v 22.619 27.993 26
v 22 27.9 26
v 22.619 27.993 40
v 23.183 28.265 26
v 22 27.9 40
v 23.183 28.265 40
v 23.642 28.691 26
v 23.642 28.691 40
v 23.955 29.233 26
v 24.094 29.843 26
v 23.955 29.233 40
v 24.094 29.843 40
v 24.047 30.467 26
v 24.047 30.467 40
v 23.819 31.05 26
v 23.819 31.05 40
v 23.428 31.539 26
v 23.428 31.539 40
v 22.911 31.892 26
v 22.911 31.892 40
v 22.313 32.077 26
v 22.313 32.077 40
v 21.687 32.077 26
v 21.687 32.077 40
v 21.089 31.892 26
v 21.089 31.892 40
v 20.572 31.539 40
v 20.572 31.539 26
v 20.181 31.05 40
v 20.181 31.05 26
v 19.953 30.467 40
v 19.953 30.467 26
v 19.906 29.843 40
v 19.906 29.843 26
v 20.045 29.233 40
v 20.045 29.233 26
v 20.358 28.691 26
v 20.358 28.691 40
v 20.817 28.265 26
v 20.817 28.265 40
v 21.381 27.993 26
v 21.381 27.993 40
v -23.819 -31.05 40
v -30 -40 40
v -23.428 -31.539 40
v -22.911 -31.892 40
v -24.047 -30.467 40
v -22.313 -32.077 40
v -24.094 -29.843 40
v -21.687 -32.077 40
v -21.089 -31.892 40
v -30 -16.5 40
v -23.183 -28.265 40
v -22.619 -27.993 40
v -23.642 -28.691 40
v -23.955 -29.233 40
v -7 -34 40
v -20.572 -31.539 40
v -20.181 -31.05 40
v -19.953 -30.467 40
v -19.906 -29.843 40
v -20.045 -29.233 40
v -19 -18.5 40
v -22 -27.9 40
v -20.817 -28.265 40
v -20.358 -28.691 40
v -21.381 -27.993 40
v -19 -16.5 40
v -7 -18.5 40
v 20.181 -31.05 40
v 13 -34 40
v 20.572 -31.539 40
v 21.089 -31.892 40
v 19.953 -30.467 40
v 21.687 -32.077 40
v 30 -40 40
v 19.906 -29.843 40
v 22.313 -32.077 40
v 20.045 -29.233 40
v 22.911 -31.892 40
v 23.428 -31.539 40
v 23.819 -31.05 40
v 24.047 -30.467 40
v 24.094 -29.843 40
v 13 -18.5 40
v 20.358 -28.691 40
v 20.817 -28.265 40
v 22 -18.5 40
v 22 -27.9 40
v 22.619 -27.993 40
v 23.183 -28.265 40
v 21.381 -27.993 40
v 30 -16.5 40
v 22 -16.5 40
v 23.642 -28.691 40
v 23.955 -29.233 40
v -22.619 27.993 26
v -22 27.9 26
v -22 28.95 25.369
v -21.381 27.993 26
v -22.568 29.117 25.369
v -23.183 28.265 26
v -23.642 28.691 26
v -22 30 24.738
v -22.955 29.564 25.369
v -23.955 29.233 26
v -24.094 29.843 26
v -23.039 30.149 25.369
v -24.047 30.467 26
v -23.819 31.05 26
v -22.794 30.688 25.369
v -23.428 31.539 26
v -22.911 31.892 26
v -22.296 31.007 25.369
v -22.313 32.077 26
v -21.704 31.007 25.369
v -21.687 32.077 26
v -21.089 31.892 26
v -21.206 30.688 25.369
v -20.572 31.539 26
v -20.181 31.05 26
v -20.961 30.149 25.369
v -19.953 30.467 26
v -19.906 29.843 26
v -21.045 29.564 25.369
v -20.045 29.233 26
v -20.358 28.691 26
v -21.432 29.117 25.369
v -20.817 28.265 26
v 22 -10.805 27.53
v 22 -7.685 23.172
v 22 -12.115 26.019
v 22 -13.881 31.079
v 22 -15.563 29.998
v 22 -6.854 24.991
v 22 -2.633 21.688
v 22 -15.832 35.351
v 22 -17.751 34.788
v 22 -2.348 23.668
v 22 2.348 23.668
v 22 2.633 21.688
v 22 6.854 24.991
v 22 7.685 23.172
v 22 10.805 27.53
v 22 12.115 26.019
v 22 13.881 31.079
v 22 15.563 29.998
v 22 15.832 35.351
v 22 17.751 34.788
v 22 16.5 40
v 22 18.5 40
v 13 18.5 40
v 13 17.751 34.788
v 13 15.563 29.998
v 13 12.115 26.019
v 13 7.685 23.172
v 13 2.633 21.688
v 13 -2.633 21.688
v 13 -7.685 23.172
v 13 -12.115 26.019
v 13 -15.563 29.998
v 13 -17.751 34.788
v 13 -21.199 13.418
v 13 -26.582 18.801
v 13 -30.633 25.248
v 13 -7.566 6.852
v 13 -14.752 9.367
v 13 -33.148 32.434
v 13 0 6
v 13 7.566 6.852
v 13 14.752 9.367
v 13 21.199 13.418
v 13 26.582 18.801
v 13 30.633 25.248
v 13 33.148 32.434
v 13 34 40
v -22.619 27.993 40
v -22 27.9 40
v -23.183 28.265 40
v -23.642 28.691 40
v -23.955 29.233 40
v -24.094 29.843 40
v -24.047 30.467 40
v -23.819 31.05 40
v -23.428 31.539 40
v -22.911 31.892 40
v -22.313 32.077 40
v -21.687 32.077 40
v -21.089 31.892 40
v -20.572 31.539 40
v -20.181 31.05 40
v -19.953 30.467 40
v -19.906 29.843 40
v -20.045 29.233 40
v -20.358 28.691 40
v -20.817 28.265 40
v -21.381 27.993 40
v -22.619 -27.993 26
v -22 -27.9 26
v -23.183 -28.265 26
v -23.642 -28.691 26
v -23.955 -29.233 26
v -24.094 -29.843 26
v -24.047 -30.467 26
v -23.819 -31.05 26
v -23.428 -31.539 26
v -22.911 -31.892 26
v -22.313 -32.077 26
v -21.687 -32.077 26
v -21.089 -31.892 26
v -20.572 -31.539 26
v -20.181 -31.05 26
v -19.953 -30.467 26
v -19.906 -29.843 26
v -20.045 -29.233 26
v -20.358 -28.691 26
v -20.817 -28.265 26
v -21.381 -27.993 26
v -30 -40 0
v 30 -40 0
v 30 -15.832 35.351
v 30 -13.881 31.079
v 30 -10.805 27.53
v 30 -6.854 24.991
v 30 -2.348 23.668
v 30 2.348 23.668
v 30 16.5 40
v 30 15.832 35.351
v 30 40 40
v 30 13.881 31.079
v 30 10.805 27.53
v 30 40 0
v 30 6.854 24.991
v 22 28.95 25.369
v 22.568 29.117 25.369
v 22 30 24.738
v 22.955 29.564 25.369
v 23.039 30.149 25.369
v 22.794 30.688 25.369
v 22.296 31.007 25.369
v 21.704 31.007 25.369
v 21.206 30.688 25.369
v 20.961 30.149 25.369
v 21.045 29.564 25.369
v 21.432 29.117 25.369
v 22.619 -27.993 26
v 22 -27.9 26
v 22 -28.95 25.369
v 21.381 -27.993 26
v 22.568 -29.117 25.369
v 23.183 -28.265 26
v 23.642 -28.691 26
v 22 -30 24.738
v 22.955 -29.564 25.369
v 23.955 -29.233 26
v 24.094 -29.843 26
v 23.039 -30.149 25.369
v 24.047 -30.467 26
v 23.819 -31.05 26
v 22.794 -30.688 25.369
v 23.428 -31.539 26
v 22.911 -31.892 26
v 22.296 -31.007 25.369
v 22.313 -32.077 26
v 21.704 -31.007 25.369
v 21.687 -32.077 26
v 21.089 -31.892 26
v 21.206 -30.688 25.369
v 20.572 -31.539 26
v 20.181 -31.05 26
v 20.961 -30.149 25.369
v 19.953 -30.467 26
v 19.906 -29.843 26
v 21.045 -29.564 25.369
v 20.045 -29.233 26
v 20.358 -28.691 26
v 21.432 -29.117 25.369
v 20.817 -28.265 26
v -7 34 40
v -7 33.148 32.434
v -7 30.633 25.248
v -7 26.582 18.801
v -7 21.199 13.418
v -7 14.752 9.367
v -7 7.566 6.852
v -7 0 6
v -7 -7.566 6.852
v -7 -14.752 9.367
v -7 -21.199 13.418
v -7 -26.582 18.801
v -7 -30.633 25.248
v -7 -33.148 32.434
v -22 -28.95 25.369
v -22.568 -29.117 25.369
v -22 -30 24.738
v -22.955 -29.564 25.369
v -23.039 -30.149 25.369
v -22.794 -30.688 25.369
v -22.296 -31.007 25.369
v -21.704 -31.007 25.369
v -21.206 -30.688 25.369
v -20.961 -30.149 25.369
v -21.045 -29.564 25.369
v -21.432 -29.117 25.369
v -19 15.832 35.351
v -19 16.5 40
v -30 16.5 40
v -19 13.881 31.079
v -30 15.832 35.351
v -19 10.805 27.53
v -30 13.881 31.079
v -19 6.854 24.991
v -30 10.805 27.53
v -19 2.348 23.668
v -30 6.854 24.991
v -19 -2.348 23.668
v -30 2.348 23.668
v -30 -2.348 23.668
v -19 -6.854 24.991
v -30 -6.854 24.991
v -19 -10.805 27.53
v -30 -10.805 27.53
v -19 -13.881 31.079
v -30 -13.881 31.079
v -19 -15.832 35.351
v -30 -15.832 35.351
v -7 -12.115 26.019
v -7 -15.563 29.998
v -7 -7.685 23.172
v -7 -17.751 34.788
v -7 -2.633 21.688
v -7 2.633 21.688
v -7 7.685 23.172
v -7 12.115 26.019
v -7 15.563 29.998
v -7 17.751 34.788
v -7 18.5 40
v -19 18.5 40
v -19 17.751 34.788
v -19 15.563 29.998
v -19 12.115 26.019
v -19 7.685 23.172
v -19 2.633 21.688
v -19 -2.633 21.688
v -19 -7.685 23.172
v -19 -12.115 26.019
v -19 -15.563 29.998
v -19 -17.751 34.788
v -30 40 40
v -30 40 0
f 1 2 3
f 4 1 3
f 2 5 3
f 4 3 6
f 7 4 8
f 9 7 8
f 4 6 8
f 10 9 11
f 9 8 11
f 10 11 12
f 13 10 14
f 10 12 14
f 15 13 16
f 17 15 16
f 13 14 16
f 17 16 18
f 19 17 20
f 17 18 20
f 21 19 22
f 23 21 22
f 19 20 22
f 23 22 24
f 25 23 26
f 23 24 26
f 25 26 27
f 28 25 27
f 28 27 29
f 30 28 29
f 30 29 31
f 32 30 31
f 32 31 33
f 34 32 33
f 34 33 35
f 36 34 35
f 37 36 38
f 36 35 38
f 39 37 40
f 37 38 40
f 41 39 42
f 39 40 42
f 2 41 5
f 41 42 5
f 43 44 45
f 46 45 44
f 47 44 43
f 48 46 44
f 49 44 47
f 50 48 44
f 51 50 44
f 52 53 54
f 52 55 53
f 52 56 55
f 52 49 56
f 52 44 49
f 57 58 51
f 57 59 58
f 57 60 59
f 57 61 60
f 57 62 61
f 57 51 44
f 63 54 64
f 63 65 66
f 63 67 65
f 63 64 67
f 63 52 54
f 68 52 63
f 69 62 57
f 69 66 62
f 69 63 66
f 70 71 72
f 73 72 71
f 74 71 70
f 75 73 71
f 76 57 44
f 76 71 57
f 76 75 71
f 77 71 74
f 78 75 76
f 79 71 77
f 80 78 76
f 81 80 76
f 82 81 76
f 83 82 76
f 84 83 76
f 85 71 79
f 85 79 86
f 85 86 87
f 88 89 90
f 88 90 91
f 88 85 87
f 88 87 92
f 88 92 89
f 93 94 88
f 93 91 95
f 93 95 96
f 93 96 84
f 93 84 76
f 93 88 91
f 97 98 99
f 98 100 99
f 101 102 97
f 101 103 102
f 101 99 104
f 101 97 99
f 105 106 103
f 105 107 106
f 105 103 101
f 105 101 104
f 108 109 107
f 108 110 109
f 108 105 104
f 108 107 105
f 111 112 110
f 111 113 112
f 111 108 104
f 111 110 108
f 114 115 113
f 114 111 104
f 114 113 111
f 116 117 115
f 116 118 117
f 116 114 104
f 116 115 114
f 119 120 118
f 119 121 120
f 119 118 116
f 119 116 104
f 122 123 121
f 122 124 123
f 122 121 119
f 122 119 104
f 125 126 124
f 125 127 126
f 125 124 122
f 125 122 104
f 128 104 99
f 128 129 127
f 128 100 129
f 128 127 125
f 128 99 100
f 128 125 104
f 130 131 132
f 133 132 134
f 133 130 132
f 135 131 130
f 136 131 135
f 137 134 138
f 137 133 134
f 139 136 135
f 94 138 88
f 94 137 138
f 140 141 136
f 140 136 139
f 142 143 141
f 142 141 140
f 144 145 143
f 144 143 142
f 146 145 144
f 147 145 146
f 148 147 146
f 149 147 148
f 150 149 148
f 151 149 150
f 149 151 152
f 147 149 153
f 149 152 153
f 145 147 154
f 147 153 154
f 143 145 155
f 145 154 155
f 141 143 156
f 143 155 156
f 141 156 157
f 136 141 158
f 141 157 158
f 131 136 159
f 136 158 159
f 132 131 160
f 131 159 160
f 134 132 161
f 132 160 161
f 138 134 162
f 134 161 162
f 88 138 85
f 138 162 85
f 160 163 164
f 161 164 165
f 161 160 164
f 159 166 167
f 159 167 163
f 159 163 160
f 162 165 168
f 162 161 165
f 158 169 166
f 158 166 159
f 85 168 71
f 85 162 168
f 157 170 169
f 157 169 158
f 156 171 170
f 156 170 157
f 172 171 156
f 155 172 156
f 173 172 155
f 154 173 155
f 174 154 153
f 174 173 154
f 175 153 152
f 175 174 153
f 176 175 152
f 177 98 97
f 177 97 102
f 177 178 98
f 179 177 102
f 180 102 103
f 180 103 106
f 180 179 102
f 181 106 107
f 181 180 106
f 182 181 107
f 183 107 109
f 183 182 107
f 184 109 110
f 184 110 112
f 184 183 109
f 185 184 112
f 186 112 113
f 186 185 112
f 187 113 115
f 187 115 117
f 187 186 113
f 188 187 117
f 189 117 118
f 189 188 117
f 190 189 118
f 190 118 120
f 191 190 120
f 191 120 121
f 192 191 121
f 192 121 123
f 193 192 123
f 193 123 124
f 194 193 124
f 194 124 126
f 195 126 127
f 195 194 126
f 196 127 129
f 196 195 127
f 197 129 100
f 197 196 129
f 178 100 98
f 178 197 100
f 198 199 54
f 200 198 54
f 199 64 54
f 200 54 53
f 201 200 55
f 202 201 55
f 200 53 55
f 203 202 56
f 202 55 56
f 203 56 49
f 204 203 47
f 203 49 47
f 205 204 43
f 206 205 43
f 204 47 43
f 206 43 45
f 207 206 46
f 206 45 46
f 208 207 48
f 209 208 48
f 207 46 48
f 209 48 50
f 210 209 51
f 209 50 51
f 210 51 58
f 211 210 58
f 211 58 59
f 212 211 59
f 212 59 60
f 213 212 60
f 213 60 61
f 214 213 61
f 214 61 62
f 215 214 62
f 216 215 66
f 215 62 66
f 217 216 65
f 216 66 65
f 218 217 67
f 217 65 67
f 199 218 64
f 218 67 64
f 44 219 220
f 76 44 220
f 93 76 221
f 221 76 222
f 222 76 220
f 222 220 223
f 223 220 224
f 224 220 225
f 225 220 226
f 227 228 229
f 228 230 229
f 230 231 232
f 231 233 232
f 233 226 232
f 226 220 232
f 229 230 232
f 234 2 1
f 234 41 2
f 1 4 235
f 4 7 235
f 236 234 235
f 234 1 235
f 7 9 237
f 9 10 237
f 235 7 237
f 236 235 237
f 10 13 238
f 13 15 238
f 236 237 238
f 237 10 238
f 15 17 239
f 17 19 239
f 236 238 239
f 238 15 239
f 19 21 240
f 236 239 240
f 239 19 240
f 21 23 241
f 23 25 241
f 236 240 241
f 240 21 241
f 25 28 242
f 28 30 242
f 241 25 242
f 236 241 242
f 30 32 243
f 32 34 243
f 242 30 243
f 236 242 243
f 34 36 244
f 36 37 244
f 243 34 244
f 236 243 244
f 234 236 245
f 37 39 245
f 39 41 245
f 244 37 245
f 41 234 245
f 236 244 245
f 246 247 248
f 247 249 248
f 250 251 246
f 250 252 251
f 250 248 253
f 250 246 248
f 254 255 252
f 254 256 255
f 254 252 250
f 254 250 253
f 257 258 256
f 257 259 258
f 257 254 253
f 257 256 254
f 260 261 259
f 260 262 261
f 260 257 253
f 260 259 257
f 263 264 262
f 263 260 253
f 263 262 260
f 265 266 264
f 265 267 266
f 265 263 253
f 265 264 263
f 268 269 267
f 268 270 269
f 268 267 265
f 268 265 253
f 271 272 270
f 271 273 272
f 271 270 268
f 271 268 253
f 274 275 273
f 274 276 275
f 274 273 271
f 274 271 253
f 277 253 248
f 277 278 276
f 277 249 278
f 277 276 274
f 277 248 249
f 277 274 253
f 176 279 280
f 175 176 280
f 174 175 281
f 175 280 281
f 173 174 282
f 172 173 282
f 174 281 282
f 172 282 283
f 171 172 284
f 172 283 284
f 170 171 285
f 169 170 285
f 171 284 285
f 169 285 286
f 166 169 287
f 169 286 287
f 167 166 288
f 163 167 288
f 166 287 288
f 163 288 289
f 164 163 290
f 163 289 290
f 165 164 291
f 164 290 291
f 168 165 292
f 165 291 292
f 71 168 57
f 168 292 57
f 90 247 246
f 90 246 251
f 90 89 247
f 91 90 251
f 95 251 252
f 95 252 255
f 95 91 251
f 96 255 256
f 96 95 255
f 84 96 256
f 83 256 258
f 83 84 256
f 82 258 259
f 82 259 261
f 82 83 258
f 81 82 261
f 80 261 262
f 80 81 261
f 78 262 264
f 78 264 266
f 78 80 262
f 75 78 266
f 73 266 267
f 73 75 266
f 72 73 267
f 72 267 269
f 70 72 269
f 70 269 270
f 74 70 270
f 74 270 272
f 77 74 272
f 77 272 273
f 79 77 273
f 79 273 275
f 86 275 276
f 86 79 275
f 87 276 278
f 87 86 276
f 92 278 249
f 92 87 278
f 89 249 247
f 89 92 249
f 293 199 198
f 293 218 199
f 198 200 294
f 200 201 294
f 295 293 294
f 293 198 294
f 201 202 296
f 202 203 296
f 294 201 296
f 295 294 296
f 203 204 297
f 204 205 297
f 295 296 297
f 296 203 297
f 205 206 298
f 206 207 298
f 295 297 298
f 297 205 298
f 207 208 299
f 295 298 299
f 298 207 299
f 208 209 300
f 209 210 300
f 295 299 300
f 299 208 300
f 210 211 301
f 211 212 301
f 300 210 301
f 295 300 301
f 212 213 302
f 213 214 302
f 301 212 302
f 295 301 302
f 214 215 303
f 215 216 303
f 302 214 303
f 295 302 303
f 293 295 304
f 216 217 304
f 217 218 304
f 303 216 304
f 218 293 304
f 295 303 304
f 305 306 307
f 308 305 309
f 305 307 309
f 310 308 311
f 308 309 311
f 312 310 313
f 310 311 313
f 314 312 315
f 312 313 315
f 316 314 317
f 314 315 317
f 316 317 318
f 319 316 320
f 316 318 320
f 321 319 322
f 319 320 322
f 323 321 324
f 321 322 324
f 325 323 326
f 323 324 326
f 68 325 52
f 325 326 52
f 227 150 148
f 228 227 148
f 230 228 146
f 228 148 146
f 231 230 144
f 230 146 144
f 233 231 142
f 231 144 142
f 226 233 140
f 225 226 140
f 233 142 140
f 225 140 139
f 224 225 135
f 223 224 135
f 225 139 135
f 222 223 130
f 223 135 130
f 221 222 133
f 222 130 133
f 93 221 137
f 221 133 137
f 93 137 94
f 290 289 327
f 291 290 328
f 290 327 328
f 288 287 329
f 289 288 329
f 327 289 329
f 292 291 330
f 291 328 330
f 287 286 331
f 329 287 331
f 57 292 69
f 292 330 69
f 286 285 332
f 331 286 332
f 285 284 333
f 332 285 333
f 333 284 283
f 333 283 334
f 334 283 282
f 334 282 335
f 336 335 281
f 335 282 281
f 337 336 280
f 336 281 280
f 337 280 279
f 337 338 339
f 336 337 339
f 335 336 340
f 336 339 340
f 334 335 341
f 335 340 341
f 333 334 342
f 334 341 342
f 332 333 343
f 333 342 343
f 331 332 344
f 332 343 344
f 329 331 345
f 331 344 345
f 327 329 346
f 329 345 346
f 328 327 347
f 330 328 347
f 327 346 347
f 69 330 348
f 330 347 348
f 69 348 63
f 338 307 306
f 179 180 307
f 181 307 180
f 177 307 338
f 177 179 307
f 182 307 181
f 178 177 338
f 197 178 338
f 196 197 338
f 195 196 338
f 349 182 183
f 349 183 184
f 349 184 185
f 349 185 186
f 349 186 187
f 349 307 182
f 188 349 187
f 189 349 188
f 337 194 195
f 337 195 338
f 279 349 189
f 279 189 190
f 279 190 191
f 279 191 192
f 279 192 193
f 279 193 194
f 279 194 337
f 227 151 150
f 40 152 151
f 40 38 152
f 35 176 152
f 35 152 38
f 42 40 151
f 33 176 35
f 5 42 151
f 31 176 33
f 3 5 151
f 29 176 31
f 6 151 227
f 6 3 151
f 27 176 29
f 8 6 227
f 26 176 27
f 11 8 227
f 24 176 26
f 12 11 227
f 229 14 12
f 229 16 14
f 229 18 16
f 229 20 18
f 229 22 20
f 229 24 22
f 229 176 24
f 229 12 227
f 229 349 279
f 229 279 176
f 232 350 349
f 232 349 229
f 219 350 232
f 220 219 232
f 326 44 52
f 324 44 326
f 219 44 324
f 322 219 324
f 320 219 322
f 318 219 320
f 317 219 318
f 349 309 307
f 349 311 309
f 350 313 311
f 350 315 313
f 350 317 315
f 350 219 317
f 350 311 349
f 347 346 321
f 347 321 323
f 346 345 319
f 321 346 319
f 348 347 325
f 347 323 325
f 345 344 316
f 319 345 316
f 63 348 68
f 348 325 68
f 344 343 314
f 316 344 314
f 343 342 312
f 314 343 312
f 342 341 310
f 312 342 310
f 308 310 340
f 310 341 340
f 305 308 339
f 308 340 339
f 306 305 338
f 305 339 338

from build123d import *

# Parameters (mm, degrees)
SCHIZZO1_W                   = 60
SCHIZZO1_H                   = 80
ESTRUSIONE_ESTRUSIONE1_DEPTH = 40
SCHIZZO3_R                   = 16.5
TAGLIO_ESTRUSIONE1_DEPTH     = 11
SCHIZZO4_R                   = 18.5
TAGLIO_ESTRUSIONE2_DEPTH     = 12
SCHIZZO5_R                   = 34
TAGLIO_ESTRUSIONE3_DEPTH     = 20
SCHIZZO6_R                   = 18.5
TAGLIO_ESTRUSIONE4_DEPTH     = 9
SCHIZZO7_R                   = 16.5
TAGLIO_ESTRUSIONE5_DEPTH     = 8


with BuildPart() as part:
    # Schizzo1 → Estrusione-Estrusione1 (new body)
    with BuildSketch(Plane.XY):
        Rectangle(SCHIZZO1_W, SCHIZZO1_H)
    extrude(amount=ESTRUSIONE_ESTRUSIONE1_DEPTH)

    # Schizzo3 → Taglio-Estrusione1 (cut)
    with BuildSketch(Plane.ZY.offset(30)):
        with Locations((40, 0)):
            Circle(SCHIZZO3_R)
    extrude(amount=-TAGLIO_ESTRUSIONE1_DEPTH, mode=Mode.SUBTRACT)

    # Schizzo4 → Taglio-Estrusione2 (cut)
    with BuildSketch(Plane.ZY.offset(19)):
        with Locations((40, 0)):
            Circle(SCHIZZO4_R)
    extrude(amount=-TAGLIO_ESTRUSIONE2_DEPTH, mode=Mode.SUBTRACT)

    # Schizzo5 → Taglio-Estrusione3 (cut)
    with BuildSketch(Plane.ZY.offset(7)):
        with Locations((40, 0)):
            Circle(SCHIZZO5_R)
    extrude(amount=-TAGLIO_ESTRUSIONE3_DEPTH, mode=Mode.SUBTRACT)

    # Schizzo6 → Taglio-Estrusione4 (cut)
    with BuildSketch(Plane.ZY.offset(-13)):
        with Locations((40, 0)):
            Circle(SCHIZZO6_R)
    extrude(amount=-TAGLIO_ESTRUSIONE4_DEPTH, mode=Mode.SUBTRACT)

    # Schizzo7 → Taglio-Estrusione5 (cut)
    with BuildSketch(Plane.ZY.offset(-22)):
        with Locations((40, 0)):
            Circle(SCHIZZO7_R)
    extrude(amount=-TAGLIO_ESTRUSIONE5_DEPTH, mode=Mode.SUBTRACT)

    # Schizzo9 → Foro filettato M5-1 (revolve, cut)
    with BuildSketch(Plane(origin=(-22, 30, 40), x_dir=(0, -1, 0), z_dir=(1, 0, 0))):
        Polygon((0, 0), (0, 15.2618073), (2.1, 14), (2.1, 0), align=None)
    foro_filettato_m5_1 = revolve(axis=Axis((-22, 30, 46.35), (0, 0, -1)), mode=Mode.SUBTRACT)

    # Specchia1: Foro filettato M5-1 across plane
    add(foro_filettato_m5_1.mirror(Plane.ZX), mode=Mode.SUBTRACT)

    # Specchia2: Foro filettato M5-1 across plane
    add(foro_filettato_m5_1.mirror(Plane(origin=(0, 0, 0), x_dir=(0, 0, 1), z_dir=(1, 0, 0))), mode=Mode.SUBTRACT)

    # Specchia2 copy 1 sketch → Specchia2 copy 1 (revolve, cut)
    with BuildSketch(Plane(origin=(22, -30, 40), x_dir=(0, 1, 0), z_dir=(-1, 0, 0))):
        Polygon((0, 0), (0, 15.2618073), (2.1, 14), (2.1, 0), align=None)
    revolve(axis=Axis((22, -30, 46.35), (0, 0, -1)), mode=Mode.SUBTRACT)


solid = part.part
